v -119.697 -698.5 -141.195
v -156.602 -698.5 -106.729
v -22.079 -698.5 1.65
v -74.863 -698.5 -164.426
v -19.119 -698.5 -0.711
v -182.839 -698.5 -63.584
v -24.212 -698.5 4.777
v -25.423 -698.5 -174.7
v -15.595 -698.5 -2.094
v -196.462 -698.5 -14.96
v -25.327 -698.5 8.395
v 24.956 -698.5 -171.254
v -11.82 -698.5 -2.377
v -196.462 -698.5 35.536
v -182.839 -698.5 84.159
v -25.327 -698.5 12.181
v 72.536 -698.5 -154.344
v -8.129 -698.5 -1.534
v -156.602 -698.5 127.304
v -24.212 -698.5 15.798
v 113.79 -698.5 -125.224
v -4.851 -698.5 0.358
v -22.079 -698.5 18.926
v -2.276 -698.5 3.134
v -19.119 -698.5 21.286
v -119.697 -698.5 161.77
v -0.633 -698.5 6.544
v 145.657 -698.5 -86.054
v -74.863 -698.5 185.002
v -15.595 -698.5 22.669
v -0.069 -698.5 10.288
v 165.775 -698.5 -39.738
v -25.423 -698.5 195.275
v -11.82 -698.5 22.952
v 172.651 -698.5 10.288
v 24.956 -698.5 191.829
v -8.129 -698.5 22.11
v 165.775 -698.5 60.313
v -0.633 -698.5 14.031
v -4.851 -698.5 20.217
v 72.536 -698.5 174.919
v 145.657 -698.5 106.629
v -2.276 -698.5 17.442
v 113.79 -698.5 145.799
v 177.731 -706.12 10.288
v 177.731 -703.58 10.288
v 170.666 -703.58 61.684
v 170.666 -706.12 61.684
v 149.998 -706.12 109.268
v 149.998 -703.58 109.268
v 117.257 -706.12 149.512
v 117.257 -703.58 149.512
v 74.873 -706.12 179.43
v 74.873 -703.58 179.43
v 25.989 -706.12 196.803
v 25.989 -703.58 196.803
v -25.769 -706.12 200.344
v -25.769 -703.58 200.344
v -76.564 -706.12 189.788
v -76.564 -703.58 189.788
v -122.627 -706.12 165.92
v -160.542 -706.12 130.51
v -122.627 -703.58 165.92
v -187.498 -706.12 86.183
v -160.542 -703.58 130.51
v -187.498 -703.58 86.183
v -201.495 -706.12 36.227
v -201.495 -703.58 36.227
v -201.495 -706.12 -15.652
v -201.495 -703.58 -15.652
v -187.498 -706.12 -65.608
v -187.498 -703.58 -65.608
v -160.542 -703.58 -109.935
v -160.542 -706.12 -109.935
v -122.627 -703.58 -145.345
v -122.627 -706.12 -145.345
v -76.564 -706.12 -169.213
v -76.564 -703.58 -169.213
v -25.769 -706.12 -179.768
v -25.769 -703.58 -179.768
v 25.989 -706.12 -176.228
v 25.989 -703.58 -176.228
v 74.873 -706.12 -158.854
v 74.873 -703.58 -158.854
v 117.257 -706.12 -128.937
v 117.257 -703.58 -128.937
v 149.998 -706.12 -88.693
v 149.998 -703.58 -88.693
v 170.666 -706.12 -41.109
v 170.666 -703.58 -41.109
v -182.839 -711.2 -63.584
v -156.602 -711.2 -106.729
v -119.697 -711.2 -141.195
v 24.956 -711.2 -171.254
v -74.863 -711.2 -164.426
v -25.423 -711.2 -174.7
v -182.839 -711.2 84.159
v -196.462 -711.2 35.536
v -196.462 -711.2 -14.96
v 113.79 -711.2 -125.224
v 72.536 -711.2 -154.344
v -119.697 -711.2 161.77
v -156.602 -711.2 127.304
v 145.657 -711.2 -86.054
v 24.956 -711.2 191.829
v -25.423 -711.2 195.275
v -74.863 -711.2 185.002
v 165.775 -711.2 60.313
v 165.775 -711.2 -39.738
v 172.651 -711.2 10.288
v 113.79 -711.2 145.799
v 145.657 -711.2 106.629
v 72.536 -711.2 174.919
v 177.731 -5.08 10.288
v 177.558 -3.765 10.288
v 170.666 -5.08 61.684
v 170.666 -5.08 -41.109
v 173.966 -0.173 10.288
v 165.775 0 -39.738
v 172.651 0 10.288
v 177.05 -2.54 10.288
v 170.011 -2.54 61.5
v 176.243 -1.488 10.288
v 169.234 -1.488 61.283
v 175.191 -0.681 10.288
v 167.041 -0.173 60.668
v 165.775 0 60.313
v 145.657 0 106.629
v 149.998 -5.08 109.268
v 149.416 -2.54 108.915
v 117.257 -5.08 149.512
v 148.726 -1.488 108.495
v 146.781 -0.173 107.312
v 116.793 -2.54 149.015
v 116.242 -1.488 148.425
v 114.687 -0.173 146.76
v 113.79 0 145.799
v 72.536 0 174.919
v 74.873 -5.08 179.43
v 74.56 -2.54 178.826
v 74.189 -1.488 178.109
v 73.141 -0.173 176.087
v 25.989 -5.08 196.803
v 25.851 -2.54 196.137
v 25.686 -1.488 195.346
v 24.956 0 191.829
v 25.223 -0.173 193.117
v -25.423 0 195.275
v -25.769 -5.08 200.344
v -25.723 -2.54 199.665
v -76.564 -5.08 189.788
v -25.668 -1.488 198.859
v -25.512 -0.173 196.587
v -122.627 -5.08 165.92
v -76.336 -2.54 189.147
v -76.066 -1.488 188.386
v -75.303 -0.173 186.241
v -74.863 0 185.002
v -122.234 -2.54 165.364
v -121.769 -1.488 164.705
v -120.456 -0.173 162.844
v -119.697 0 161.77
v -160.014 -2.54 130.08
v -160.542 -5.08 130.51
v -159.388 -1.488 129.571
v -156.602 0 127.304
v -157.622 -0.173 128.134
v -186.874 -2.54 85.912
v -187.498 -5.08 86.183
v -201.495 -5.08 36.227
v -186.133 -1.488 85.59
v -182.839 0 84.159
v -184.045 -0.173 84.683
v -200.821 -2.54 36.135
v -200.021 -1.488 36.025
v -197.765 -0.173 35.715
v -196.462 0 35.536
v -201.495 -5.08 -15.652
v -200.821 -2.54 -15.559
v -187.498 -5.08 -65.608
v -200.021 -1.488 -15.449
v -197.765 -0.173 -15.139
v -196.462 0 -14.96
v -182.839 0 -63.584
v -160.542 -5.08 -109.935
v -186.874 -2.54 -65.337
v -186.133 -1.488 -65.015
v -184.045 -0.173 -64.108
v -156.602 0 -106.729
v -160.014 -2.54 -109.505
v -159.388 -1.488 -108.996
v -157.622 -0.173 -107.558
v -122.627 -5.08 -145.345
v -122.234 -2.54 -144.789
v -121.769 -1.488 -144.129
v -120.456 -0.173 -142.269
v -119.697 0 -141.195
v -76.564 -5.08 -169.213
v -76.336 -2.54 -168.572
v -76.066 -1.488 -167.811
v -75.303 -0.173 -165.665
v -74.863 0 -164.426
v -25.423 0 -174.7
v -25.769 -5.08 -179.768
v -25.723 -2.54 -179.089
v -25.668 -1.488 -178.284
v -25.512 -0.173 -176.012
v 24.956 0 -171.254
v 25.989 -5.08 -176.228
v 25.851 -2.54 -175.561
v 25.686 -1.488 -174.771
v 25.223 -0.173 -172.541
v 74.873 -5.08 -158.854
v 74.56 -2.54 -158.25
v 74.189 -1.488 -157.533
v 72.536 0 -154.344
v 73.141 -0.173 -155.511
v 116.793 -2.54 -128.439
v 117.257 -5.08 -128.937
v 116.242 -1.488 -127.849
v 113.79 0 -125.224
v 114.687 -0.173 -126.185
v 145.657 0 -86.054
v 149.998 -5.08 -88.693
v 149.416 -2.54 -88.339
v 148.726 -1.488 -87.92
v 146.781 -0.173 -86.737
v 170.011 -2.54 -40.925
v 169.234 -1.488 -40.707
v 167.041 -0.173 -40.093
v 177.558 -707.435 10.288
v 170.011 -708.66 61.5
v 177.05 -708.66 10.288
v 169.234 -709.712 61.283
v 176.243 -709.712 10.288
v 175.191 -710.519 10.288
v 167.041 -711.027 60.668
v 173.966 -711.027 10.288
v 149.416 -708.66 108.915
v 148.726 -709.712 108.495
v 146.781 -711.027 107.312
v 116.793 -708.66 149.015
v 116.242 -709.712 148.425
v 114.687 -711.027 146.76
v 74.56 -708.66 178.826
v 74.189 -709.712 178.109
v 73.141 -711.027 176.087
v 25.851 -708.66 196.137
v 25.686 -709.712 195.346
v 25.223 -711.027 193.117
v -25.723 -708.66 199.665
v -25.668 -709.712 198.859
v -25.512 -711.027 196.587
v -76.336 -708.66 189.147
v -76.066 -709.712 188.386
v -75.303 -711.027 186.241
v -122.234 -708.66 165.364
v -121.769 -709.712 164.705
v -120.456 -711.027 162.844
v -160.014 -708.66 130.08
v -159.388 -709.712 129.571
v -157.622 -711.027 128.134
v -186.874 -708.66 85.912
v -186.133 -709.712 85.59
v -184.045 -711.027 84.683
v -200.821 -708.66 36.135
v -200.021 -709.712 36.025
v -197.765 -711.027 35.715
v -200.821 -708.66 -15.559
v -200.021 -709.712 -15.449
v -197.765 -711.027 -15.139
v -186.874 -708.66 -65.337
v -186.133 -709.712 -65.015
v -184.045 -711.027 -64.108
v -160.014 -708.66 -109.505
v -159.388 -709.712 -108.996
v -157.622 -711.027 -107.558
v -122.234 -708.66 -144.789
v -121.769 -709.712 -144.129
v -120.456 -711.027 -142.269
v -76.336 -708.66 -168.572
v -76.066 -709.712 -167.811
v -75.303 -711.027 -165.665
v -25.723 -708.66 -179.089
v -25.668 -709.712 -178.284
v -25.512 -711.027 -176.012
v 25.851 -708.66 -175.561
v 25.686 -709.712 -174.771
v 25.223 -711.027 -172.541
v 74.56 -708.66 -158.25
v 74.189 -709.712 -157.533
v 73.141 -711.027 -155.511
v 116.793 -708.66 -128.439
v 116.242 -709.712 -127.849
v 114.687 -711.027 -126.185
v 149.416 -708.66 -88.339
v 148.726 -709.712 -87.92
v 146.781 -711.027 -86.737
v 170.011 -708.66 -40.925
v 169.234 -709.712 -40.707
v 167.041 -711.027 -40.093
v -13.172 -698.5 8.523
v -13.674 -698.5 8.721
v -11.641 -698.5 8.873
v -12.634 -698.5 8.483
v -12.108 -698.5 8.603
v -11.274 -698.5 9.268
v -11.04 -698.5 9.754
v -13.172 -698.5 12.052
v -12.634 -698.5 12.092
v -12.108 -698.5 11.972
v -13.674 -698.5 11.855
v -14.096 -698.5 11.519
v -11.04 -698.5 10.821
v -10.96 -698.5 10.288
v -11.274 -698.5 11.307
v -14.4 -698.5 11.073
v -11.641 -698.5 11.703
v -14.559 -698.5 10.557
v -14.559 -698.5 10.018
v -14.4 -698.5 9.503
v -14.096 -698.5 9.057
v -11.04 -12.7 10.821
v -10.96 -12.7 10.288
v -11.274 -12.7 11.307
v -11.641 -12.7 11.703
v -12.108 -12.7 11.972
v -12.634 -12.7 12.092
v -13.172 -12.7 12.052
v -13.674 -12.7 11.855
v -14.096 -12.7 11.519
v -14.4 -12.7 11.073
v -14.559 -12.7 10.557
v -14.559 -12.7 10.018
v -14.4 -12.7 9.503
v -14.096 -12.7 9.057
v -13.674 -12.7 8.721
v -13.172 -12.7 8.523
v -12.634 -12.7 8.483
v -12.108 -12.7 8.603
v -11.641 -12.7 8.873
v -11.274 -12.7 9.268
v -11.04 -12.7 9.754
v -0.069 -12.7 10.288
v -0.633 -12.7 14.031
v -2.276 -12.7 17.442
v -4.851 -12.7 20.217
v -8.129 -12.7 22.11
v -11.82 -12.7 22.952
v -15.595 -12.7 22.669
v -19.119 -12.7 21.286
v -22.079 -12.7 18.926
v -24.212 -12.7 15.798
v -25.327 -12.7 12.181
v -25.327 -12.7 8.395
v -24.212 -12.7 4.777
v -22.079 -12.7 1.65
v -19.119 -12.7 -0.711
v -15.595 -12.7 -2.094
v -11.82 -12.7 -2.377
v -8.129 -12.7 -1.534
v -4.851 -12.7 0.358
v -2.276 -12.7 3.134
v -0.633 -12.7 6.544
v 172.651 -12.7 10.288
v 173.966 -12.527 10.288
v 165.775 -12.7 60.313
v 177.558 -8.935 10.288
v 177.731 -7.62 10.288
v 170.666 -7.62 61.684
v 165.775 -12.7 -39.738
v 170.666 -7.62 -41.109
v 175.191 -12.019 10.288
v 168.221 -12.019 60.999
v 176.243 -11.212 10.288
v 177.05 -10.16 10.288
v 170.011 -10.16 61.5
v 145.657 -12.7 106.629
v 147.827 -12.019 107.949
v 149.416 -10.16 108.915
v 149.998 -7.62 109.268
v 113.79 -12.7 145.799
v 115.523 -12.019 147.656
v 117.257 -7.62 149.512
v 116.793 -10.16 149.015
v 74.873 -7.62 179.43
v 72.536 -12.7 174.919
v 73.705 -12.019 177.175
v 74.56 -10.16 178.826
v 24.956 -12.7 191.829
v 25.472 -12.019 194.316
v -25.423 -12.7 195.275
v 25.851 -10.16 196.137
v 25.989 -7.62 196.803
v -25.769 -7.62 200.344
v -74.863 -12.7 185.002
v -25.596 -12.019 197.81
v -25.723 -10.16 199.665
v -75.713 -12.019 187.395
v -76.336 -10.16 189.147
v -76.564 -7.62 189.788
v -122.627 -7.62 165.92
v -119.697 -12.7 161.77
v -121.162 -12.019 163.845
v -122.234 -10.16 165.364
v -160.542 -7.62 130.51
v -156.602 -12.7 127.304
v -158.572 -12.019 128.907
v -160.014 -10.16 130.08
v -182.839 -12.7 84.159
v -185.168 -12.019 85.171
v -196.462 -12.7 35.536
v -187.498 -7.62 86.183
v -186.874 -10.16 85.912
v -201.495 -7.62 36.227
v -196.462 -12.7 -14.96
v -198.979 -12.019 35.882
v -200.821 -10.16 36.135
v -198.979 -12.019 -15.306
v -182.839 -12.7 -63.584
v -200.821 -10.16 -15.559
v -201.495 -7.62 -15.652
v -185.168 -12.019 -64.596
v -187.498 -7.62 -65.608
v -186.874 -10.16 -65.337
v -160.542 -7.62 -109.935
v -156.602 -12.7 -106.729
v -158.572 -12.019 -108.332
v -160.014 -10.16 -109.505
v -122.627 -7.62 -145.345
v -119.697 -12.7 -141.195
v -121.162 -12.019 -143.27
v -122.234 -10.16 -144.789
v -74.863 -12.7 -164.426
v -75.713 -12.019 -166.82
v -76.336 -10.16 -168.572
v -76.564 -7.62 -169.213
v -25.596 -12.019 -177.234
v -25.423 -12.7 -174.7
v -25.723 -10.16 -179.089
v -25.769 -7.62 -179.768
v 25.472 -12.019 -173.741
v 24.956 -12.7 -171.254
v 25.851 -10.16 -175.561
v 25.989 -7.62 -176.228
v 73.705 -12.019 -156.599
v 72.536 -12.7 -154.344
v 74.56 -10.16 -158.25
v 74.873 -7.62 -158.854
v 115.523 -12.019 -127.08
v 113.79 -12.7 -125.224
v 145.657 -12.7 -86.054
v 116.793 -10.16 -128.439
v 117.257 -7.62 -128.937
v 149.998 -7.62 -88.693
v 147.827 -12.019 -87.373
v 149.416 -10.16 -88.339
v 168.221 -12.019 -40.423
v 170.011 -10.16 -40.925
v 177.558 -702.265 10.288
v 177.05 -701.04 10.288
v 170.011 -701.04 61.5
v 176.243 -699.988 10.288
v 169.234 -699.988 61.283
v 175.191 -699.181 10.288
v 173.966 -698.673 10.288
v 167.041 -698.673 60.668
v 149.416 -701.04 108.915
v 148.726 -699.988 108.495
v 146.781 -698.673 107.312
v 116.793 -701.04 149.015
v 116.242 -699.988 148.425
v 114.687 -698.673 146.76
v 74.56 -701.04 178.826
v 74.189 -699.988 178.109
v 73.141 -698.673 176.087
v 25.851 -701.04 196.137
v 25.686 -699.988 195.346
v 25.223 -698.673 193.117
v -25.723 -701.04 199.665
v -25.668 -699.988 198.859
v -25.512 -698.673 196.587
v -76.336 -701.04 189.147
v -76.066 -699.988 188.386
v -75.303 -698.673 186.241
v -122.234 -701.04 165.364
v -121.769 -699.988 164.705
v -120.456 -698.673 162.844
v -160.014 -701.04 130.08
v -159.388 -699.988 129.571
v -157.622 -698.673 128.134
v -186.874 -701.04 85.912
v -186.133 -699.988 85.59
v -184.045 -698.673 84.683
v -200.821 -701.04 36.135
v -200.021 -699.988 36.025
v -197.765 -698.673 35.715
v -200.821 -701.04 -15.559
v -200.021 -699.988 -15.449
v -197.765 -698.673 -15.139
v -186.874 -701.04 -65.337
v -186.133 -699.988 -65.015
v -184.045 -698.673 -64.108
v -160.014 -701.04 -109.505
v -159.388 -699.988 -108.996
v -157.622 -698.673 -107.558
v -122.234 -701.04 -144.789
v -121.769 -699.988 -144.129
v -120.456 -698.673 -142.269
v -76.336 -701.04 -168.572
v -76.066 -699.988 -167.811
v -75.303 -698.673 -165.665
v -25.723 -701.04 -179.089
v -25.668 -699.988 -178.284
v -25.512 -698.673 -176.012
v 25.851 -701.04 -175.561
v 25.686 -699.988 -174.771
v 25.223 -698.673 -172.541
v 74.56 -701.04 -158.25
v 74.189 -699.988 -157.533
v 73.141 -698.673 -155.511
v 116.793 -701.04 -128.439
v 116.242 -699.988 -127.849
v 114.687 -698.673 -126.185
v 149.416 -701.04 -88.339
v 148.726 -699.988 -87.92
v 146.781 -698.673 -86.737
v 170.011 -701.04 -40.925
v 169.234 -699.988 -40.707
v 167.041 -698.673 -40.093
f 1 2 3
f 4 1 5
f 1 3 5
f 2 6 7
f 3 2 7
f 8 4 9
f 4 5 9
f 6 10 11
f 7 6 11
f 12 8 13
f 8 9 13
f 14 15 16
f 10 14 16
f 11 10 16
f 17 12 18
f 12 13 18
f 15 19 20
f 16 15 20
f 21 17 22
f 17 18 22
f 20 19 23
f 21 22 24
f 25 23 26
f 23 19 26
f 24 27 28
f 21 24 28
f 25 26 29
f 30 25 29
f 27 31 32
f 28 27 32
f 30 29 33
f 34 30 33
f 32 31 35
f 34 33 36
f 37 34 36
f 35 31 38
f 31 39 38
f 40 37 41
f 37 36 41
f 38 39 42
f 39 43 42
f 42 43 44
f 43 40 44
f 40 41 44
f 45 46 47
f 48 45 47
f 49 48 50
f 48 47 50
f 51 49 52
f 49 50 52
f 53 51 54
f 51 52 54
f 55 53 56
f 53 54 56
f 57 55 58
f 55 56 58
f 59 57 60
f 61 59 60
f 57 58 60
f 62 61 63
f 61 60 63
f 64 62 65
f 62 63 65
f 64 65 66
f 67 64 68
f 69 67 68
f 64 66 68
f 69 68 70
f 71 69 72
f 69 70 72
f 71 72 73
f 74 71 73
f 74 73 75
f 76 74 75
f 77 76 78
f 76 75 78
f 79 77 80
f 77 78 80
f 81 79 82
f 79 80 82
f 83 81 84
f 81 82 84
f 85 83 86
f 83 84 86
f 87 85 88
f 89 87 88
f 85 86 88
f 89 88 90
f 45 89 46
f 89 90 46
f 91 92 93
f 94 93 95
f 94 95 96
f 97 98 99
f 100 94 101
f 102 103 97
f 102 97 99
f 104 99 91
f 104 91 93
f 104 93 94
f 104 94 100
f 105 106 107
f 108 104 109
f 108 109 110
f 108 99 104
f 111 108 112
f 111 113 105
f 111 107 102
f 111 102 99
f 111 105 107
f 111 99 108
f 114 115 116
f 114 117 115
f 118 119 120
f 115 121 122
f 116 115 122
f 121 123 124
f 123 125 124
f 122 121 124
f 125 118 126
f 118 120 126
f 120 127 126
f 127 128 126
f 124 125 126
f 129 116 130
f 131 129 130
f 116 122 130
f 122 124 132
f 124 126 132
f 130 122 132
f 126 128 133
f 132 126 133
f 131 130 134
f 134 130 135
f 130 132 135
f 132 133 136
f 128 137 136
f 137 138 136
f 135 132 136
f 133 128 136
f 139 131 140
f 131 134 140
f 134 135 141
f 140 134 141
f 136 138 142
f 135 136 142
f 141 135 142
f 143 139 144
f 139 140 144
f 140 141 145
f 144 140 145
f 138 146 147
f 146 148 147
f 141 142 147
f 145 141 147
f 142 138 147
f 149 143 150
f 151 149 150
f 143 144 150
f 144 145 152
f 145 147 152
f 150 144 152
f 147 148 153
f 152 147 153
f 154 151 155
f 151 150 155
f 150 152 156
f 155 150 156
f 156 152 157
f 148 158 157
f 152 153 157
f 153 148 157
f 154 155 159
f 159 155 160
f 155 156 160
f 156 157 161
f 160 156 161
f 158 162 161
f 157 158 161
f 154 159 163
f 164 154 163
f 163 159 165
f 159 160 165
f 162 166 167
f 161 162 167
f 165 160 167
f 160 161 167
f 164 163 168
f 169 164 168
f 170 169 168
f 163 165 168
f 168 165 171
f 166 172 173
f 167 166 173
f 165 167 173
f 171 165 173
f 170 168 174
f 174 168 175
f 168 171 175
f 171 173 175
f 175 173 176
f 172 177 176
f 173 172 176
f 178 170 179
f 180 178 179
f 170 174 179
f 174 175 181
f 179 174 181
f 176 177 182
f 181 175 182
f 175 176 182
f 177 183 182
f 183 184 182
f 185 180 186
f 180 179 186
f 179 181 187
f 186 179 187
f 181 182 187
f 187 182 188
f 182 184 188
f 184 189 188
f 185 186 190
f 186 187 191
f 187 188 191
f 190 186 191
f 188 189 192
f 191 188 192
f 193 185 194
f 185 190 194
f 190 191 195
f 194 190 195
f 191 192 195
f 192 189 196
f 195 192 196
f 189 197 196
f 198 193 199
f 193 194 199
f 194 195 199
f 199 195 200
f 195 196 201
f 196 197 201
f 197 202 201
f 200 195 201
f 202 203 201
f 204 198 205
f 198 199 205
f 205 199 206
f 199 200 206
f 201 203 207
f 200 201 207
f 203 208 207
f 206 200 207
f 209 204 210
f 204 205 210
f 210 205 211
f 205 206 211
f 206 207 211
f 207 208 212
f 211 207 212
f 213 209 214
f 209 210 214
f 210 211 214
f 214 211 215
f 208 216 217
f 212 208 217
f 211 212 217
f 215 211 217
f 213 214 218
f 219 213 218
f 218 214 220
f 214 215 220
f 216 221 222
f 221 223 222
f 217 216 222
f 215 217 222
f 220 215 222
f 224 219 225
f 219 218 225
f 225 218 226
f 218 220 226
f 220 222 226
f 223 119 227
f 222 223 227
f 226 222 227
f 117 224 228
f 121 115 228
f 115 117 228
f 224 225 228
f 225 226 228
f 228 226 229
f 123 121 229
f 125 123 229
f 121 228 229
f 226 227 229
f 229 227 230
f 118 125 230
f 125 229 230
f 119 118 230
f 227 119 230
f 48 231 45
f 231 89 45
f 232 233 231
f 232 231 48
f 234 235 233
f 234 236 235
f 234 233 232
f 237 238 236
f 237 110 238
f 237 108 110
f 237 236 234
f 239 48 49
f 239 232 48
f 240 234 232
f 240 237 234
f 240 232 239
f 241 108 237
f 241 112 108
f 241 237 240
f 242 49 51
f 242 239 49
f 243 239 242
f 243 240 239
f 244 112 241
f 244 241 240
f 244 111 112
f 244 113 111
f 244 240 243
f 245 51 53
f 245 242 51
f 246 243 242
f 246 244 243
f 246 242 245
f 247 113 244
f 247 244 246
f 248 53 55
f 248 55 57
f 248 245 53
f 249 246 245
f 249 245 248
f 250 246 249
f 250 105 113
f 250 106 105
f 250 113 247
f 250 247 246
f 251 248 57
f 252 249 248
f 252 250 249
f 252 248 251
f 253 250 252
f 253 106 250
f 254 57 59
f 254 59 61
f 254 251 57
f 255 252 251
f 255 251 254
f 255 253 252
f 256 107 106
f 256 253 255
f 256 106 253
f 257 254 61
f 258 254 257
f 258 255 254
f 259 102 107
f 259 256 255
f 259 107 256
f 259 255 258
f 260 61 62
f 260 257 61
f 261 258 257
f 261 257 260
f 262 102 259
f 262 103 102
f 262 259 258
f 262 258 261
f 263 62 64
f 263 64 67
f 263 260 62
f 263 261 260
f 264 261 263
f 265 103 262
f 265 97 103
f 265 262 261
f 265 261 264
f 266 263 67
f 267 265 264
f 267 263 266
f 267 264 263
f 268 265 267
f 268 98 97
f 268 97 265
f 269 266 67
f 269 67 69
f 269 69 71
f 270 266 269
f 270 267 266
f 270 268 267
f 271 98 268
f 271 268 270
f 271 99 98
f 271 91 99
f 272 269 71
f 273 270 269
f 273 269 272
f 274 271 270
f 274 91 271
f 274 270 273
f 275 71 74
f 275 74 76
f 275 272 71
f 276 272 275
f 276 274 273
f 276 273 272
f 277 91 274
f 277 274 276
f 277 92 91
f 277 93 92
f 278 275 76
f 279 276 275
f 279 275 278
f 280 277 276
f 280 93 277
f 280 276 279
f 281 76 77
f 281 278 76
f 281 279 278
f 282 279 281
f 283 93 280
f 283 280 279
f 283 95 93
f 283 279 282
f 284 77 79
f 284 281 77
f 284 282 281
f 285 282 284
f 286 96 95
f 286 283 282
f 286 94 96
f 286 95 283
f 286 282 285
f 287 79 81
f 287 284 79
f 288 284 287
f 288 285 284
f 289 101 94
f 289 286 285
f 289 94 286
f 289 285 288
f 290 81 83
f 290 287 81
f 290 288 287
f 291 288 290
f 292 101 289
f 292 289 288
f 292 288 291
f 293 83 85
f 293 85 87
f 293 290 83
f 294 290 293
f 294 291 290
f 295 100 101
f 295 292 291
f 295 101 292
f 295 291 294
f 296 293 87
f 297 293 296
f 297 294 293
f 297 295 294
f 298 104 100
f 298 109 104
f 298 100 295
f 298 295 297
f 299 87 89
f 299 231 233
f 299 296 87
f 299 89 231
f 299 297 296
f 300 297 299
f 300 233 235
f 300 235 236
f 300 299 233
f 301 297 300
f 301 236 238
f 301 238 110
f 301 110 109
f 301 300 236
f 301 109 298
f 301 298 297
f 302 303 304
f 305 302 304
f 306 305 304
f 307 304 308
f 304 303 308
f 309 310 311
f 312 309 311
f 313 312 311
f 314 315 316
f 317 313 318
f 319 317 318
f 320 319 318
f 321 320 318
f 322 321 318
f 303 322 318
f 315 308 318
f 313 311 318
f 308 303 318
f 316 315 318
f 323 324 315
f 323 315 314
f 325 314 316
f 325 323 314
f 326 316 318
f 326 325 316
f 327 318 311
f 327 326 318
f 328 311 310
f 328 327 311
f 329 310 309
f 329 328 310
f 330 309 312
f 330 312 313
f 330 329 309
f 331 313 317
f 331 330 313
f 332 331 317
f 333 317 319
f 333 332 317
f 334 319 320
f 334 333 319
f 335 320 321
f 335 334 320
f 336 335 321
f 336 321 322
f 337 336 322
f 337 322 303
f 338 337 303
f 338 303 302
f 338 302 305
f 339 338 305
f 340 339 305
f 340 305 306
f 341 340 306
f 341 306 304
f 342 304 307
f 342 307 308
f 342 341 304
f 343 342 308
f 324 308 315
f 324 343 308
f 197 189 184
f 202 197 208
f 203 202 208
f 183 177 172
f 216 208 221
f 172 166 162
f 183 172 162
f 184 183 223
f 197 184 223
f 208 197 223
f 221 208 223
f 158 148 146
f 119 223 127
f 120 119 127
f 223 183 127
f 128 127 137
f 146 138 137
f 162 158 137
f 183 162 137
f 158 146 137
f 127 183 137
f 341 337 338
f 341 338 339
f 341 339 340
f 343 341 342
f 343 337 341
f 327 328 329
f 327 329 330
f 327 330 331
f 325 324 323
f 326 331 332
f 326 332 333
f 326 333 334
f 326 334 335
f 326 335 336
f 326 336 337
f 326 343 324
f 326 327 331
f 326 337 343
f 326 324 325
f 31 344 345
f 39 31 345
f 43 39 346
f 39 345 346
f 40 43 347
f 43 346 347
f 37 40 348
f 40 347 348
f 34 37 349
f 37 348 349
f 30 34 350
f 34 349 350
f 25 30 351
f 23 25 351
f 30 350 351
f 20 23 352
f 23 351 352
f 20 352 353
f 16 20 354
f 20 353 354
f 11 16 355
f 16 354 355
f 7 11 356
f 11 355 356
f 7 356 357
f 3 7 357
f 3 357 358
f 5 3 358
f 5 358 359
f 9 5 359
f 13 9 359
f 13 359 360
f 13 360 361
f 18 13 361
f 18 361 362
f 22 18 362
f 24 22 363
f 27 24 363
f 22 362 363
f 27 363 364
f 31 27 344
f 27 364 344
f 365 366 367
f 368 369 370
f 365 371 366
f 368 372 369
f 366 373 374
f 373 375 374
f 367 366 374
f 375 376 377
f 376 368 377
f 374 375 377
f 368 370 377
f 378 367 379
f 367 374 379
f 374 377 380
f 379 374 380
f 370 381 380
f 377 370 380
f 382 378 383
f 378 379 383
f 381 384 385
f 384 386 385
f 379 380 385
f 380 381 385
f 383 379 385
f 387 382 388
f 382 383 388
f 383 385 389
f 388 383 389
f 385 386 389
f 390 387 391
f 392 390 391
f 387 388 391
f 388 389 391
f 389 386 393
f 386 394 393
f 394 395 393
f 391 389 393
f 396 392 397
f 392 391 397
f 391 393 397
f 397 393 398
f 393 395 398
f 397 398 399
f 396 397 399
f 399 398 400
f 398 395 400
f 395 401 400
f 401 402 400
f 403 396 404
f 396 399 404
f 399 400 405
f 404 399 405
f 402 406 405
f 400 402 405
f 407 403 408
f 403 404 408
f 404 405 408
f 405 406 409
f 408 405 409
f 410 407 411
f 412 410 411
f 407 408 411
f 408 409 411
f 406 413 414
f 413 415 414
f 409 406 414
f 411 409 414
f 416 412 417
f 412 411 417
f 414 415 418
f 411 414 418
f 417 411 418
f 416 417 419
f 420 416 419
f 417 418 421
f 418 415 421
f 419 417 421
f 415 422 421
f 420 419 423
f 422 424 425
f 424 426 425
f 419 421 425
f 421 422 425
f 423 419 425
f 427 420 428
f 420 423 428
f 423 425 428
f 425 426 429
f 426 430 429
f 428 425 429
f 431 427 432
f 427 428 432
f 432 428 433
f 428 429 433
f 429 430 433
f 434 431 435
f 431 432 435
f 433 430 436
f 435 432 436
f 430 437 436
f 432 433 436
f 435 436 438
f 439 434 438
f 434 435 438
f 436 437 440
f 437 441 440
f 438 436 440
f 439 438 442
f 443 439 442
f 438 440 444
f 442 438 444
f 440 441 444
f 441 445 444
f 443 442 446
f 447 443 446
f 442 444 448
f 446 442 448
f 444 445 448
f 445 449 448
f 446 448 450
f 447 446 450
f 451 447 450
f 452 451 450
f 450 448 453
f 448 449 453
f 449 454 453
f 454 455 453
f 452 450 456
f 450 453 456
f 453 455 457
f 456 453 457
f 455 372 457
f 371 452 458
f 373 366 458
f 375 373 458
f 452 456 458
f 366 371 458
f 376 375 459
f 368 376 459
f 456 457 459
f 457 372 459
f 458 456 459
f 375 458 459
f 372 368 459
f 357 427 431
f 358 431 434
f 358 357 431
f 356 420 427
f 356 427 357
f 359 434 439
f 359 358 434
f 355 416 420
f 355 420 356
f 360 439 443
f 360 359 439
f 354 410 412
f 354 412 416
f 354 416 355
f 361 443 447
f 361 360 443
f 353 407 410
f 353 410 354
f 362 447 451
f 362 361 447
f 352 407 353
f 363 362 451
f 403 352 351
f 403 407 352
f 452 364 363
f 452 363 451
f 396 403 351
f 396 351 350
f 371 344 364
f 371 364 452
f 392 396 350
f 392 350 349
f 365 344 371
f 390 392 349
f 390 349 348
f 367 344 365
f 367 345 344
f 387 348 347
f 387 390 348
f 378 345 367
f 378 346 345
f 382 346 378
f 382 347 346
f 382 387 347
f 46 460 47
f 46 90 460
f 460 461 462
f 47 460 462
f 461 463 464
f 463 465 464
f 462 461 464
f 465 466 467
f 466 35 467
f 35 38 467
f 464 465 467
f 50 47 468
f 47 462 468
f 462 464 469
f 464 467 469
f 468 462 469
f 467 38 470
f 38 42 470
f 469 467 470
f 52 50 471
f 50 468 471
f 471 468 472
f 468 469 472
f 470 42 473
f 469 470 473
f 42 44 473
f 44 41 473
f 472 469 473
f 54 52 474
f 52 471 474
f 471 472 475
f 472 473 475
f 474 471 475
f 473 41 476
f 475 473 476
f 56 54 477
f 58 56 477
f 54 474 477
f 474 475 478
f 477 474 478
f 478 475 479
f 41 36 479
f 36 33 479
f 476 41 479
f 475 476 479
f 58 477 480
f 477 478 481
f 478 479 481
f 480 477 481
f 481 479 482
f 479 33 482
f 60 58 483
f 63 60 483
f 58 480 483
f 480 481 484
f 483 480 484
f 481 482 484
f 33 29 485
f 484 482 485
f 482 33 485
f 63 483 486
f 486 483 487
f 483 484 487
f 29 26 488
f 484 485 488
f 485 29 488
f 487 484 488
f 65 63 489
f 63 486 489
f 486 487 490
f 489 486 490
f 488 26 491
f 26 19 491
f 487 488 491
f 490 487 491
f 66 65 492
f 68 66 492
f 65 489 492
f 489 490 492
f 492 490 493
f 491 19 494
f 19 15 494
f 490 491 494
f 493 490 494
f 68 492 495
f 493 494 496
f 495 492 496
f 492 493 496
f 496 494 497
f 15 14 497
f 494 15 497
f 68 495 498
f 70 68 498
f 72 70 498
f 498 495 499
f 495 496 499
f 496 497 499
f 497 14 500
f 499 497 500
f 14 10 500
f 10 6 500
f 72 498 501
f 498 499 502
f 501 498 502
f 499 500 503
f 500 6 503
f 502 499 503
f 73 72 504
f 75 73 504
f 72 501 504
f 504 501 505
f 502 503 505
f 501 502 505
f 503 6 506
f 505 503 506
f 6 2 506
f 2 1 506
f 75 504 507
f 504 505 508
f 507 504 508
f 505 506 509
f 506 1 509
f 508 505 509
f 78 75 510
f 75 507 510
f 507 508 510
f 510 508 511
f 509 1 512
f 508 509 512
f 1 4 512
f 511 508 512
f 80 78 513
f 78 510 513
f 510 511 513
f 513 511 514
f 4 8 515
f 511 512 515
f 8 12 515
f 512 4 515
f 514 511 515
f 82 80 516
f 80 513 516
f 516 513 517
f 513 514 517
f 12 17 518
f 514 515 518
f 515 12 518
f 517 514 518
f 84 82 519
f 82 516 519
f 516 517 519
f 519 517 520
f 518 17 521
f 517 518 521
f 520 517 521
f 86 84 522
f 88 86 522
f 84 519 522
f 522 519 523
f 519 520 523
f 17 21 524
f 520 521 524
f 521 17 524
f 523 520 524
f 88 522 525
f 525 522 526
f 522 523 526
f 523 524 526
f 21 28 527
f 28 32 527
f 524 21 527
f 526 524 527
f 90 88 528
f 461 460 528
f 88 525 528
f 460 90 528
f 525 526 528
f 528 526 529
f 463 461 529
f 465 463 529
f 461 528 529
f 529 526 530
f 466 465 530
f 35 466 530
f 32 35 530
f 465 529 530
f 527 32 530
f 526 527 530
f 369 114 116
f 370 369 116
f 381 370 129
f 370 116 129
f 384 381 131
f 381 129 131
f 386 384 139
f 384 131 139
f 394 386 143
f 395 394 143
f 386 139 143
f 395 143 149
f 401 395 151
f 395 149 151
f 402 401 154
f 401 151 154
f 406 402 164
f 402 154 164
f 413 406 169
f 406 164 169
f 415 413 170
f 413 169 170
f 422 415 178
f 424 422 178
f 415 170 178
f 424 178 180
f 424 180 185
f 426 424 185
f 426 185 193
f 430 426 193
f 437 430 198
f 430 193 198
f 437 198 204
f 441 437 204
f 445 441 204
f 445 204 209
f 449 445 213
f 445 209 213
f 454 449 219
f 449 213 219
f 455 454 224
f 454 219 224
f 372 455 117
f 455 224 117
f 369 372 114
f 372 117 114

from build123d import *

# Parameters (mm, degrees)
F0_R     = 190.5
F1_DEPTH = 12.7
F2_R     = 12.7
F2_R_2   = 1.8096717608
F3_DEPTH = 685.8
F4_R     = 190.5
F5_DEPTH = 12.7
F6_R     = 5.08


with BuildPart() as f1:
    # F0 (on Front) → F1 (new body)
    with BuildSketch(Plane.XZ):
        with Locations((-12.7692446113, 10.287723504)):
            Circle(F0_R)
    extrude(amount=F1_DEPTH)

    # F2 (on face) → F3 (join)
    with BuildSketch(Plane.XZ.offset(12.7)):
        with Locations((-12.7692446113, 10.287723504)):
            Circle(F2_R)
        with Locations((-12.7692446113, 10.287723504)):
            Circle(F2_R_2, mode=Mode.SUBTRACT)
    extrude(amount=F3_DEPTH)

    # F4 (on face) → F5 (join)
    with BuildSketch(Plane.XZ.offset(698.5)):
        with Locations((-12.7692446113, 10.287723504)):
            Circle(F4_R)
    extrude(amount=F5_DEPTH)

    # F6
    f6_edges = [f1.edges().sort_by_distance(p)[0] for p in [
        (-203.269245, -711.2, 10.287724),
        (-203.269245, -698.5, 10.287724),
        (-203.269245, -12.7, 10.287724),
        (-203.269245, 0, 10.287724),
    ]]
    fillet(f6_edges, radius=F6_R)


solid = f1.part
